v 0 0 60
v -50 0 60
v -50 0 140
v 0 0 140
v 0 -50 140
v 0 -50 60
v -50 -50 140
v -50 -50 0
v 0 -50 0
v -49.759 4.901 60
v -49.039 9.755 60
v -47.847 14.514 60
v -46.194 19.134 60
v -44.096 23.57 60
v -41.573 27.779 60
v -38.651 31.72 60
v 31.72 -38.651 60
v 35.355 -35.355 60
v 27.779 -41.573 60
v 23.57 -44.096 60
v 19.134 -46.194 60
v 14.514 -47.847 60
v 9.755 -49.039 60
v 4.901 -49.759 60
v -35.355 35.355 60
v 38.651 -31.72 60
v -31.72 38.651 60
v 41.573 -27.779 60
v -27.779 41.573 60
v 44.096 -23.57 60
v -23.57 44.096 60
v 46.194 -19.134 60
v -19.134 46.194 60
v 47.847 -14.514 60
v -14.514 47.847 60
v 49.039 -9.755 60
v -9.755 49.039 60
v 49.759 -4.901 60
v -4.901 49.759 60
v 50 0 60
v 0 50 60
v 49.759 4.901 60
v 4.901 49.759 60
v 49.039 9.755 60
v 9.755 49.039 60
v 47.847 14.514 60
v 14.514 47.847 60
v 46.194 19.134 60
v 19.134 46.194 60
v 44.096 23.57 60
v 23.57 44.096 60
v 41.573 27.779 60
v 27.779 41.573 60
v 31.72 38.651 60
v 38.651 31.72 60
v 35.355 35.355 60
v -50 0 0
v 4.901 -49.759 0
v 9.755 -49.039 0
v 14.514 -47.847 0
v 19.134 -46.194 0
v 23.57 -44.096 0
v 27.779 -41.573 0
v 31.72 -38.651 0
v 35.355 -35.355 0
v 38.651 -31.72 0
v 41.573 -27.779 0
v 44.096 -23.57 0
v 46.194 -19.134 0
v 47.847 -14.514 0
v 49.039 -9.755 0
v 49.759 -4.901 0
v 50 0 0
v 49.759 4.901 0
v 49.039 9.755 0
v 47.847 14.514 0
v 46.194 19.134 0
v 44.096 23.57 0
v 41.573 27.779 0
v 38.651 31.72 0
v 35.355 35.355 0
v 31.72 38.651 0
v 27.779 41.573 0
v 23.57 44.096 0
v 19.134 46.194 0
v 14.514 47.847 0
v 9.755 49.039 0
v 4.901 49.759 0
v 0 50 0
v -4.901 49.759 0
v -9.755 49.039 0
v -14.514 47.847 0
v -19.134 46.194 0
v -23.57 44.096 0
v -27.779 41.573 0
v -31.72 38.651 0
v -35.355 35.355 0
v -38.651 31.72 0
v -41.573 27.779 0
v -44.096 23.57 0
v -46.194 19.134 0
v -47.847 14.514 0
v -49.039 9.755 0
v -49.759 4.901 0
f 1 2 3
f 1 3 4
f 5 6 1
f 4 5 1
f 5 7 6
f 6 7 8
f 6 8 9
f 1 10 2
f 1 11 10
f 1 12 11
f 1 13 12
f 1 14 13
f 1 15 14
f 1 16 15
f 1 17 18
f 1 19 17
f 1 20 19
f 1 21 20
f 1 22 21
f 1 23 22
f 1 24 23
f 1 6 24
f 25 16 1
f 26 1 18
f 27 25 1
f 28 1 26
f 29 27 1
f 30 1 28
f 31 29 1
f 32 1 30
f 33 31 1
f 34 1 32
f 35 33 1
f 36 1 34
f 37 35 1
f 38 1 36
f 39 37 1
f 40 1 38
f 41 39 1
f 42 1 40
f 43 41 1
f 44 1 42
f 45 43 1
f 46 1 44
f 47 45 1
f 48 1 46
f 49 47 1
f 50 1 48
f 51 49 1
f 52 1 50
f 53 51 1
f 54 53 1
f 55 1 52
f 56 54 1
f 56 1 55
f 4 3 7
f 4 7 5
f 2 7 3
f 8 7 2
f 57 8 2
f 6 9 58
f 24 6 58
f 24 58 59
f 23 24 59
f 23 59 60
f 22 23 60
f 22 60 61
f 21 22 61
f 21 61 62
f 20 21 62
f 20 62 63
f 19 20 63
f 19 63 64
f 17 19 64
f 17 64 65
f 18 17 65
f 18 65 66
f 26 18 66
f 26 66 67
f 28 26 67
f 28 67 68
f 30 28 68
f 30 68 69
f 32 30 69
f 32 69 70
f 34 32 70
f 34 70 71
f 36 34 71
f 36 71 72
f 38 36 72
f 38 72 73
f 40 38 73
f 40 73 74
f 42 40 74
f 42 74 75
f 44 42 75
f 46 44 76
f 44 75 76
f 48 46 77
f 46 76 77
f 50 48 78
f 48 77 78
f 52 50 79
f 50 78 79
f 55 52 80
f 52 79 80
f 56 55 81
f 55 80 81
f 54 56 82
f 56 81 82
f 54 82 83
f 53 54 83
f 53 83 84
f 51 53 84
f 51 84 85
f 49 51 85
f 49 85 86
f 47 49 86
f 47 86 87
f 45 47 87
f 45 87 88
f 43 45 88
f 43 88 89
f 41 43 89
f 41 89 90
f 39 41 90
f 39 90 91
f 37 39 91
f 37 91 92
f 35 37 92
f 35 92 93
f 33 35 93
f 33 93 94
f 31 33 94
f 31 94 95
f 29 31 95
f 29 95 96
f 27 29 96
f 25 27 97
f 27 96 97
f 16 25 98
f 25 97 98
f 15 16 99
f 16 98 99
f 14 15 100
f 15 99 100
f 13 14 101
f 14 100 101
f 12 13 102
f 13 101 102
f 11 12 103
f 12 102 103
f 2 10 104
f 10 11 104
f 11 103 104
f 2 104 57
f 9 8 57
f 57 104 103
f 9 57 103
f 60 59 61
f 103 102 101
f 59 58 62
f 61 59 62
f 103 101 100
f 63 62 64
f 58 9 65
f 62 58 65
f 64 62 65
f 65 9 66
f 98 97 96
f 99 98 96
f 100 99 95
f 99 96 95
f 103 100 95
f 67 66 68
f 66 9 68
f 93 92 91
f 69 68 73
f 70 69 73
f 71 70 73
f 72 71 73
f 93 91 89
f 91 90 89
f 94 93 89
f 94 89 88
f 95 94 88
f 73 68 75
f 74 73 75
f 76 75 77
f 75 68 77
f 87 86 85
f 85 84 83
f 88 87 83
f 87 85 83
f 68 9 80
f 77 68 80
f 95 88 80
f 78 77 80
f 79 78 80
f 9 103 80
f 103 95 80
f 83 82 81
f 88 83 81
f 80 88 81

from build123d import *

# Parameters (mm, degrees)
F0_R     = 50
F1_DEPTH = 60
F3_DEPTH = 80
F4_W     = 50
F4_H     = 50
F5_DEPTH = 140


with BuildPart() as f1:
    # F0 (on Top) → F1 (new body)
    with BuildSketch(Plane.XY):
        Circle(F0_R)
    extrude(amount=F1_DEPTH)

    # F2 (on face) → F3 (cut)
    with BuildSketch(Plane.XY.offset(60)):
        with BuildLine():
            Line((0, -50), (0, 0))
            Line((0, 0), (-50, 0))
            ThreePointArc((-50, 0), (-35.355339, -35.355339), (0, -50))
        make_face()
    extrude(amount=-F3_DEPTH, mode=Mode.SUBTRACT)

    # F4 (on Top) → F5 (join)
    with BuildSketch(Plane.XY):
        with Locations((-25, -25)):
            Rectangle(F4_W, F4_H)
    extrude(amount=F5_DEPTH)


solid = f1.part
